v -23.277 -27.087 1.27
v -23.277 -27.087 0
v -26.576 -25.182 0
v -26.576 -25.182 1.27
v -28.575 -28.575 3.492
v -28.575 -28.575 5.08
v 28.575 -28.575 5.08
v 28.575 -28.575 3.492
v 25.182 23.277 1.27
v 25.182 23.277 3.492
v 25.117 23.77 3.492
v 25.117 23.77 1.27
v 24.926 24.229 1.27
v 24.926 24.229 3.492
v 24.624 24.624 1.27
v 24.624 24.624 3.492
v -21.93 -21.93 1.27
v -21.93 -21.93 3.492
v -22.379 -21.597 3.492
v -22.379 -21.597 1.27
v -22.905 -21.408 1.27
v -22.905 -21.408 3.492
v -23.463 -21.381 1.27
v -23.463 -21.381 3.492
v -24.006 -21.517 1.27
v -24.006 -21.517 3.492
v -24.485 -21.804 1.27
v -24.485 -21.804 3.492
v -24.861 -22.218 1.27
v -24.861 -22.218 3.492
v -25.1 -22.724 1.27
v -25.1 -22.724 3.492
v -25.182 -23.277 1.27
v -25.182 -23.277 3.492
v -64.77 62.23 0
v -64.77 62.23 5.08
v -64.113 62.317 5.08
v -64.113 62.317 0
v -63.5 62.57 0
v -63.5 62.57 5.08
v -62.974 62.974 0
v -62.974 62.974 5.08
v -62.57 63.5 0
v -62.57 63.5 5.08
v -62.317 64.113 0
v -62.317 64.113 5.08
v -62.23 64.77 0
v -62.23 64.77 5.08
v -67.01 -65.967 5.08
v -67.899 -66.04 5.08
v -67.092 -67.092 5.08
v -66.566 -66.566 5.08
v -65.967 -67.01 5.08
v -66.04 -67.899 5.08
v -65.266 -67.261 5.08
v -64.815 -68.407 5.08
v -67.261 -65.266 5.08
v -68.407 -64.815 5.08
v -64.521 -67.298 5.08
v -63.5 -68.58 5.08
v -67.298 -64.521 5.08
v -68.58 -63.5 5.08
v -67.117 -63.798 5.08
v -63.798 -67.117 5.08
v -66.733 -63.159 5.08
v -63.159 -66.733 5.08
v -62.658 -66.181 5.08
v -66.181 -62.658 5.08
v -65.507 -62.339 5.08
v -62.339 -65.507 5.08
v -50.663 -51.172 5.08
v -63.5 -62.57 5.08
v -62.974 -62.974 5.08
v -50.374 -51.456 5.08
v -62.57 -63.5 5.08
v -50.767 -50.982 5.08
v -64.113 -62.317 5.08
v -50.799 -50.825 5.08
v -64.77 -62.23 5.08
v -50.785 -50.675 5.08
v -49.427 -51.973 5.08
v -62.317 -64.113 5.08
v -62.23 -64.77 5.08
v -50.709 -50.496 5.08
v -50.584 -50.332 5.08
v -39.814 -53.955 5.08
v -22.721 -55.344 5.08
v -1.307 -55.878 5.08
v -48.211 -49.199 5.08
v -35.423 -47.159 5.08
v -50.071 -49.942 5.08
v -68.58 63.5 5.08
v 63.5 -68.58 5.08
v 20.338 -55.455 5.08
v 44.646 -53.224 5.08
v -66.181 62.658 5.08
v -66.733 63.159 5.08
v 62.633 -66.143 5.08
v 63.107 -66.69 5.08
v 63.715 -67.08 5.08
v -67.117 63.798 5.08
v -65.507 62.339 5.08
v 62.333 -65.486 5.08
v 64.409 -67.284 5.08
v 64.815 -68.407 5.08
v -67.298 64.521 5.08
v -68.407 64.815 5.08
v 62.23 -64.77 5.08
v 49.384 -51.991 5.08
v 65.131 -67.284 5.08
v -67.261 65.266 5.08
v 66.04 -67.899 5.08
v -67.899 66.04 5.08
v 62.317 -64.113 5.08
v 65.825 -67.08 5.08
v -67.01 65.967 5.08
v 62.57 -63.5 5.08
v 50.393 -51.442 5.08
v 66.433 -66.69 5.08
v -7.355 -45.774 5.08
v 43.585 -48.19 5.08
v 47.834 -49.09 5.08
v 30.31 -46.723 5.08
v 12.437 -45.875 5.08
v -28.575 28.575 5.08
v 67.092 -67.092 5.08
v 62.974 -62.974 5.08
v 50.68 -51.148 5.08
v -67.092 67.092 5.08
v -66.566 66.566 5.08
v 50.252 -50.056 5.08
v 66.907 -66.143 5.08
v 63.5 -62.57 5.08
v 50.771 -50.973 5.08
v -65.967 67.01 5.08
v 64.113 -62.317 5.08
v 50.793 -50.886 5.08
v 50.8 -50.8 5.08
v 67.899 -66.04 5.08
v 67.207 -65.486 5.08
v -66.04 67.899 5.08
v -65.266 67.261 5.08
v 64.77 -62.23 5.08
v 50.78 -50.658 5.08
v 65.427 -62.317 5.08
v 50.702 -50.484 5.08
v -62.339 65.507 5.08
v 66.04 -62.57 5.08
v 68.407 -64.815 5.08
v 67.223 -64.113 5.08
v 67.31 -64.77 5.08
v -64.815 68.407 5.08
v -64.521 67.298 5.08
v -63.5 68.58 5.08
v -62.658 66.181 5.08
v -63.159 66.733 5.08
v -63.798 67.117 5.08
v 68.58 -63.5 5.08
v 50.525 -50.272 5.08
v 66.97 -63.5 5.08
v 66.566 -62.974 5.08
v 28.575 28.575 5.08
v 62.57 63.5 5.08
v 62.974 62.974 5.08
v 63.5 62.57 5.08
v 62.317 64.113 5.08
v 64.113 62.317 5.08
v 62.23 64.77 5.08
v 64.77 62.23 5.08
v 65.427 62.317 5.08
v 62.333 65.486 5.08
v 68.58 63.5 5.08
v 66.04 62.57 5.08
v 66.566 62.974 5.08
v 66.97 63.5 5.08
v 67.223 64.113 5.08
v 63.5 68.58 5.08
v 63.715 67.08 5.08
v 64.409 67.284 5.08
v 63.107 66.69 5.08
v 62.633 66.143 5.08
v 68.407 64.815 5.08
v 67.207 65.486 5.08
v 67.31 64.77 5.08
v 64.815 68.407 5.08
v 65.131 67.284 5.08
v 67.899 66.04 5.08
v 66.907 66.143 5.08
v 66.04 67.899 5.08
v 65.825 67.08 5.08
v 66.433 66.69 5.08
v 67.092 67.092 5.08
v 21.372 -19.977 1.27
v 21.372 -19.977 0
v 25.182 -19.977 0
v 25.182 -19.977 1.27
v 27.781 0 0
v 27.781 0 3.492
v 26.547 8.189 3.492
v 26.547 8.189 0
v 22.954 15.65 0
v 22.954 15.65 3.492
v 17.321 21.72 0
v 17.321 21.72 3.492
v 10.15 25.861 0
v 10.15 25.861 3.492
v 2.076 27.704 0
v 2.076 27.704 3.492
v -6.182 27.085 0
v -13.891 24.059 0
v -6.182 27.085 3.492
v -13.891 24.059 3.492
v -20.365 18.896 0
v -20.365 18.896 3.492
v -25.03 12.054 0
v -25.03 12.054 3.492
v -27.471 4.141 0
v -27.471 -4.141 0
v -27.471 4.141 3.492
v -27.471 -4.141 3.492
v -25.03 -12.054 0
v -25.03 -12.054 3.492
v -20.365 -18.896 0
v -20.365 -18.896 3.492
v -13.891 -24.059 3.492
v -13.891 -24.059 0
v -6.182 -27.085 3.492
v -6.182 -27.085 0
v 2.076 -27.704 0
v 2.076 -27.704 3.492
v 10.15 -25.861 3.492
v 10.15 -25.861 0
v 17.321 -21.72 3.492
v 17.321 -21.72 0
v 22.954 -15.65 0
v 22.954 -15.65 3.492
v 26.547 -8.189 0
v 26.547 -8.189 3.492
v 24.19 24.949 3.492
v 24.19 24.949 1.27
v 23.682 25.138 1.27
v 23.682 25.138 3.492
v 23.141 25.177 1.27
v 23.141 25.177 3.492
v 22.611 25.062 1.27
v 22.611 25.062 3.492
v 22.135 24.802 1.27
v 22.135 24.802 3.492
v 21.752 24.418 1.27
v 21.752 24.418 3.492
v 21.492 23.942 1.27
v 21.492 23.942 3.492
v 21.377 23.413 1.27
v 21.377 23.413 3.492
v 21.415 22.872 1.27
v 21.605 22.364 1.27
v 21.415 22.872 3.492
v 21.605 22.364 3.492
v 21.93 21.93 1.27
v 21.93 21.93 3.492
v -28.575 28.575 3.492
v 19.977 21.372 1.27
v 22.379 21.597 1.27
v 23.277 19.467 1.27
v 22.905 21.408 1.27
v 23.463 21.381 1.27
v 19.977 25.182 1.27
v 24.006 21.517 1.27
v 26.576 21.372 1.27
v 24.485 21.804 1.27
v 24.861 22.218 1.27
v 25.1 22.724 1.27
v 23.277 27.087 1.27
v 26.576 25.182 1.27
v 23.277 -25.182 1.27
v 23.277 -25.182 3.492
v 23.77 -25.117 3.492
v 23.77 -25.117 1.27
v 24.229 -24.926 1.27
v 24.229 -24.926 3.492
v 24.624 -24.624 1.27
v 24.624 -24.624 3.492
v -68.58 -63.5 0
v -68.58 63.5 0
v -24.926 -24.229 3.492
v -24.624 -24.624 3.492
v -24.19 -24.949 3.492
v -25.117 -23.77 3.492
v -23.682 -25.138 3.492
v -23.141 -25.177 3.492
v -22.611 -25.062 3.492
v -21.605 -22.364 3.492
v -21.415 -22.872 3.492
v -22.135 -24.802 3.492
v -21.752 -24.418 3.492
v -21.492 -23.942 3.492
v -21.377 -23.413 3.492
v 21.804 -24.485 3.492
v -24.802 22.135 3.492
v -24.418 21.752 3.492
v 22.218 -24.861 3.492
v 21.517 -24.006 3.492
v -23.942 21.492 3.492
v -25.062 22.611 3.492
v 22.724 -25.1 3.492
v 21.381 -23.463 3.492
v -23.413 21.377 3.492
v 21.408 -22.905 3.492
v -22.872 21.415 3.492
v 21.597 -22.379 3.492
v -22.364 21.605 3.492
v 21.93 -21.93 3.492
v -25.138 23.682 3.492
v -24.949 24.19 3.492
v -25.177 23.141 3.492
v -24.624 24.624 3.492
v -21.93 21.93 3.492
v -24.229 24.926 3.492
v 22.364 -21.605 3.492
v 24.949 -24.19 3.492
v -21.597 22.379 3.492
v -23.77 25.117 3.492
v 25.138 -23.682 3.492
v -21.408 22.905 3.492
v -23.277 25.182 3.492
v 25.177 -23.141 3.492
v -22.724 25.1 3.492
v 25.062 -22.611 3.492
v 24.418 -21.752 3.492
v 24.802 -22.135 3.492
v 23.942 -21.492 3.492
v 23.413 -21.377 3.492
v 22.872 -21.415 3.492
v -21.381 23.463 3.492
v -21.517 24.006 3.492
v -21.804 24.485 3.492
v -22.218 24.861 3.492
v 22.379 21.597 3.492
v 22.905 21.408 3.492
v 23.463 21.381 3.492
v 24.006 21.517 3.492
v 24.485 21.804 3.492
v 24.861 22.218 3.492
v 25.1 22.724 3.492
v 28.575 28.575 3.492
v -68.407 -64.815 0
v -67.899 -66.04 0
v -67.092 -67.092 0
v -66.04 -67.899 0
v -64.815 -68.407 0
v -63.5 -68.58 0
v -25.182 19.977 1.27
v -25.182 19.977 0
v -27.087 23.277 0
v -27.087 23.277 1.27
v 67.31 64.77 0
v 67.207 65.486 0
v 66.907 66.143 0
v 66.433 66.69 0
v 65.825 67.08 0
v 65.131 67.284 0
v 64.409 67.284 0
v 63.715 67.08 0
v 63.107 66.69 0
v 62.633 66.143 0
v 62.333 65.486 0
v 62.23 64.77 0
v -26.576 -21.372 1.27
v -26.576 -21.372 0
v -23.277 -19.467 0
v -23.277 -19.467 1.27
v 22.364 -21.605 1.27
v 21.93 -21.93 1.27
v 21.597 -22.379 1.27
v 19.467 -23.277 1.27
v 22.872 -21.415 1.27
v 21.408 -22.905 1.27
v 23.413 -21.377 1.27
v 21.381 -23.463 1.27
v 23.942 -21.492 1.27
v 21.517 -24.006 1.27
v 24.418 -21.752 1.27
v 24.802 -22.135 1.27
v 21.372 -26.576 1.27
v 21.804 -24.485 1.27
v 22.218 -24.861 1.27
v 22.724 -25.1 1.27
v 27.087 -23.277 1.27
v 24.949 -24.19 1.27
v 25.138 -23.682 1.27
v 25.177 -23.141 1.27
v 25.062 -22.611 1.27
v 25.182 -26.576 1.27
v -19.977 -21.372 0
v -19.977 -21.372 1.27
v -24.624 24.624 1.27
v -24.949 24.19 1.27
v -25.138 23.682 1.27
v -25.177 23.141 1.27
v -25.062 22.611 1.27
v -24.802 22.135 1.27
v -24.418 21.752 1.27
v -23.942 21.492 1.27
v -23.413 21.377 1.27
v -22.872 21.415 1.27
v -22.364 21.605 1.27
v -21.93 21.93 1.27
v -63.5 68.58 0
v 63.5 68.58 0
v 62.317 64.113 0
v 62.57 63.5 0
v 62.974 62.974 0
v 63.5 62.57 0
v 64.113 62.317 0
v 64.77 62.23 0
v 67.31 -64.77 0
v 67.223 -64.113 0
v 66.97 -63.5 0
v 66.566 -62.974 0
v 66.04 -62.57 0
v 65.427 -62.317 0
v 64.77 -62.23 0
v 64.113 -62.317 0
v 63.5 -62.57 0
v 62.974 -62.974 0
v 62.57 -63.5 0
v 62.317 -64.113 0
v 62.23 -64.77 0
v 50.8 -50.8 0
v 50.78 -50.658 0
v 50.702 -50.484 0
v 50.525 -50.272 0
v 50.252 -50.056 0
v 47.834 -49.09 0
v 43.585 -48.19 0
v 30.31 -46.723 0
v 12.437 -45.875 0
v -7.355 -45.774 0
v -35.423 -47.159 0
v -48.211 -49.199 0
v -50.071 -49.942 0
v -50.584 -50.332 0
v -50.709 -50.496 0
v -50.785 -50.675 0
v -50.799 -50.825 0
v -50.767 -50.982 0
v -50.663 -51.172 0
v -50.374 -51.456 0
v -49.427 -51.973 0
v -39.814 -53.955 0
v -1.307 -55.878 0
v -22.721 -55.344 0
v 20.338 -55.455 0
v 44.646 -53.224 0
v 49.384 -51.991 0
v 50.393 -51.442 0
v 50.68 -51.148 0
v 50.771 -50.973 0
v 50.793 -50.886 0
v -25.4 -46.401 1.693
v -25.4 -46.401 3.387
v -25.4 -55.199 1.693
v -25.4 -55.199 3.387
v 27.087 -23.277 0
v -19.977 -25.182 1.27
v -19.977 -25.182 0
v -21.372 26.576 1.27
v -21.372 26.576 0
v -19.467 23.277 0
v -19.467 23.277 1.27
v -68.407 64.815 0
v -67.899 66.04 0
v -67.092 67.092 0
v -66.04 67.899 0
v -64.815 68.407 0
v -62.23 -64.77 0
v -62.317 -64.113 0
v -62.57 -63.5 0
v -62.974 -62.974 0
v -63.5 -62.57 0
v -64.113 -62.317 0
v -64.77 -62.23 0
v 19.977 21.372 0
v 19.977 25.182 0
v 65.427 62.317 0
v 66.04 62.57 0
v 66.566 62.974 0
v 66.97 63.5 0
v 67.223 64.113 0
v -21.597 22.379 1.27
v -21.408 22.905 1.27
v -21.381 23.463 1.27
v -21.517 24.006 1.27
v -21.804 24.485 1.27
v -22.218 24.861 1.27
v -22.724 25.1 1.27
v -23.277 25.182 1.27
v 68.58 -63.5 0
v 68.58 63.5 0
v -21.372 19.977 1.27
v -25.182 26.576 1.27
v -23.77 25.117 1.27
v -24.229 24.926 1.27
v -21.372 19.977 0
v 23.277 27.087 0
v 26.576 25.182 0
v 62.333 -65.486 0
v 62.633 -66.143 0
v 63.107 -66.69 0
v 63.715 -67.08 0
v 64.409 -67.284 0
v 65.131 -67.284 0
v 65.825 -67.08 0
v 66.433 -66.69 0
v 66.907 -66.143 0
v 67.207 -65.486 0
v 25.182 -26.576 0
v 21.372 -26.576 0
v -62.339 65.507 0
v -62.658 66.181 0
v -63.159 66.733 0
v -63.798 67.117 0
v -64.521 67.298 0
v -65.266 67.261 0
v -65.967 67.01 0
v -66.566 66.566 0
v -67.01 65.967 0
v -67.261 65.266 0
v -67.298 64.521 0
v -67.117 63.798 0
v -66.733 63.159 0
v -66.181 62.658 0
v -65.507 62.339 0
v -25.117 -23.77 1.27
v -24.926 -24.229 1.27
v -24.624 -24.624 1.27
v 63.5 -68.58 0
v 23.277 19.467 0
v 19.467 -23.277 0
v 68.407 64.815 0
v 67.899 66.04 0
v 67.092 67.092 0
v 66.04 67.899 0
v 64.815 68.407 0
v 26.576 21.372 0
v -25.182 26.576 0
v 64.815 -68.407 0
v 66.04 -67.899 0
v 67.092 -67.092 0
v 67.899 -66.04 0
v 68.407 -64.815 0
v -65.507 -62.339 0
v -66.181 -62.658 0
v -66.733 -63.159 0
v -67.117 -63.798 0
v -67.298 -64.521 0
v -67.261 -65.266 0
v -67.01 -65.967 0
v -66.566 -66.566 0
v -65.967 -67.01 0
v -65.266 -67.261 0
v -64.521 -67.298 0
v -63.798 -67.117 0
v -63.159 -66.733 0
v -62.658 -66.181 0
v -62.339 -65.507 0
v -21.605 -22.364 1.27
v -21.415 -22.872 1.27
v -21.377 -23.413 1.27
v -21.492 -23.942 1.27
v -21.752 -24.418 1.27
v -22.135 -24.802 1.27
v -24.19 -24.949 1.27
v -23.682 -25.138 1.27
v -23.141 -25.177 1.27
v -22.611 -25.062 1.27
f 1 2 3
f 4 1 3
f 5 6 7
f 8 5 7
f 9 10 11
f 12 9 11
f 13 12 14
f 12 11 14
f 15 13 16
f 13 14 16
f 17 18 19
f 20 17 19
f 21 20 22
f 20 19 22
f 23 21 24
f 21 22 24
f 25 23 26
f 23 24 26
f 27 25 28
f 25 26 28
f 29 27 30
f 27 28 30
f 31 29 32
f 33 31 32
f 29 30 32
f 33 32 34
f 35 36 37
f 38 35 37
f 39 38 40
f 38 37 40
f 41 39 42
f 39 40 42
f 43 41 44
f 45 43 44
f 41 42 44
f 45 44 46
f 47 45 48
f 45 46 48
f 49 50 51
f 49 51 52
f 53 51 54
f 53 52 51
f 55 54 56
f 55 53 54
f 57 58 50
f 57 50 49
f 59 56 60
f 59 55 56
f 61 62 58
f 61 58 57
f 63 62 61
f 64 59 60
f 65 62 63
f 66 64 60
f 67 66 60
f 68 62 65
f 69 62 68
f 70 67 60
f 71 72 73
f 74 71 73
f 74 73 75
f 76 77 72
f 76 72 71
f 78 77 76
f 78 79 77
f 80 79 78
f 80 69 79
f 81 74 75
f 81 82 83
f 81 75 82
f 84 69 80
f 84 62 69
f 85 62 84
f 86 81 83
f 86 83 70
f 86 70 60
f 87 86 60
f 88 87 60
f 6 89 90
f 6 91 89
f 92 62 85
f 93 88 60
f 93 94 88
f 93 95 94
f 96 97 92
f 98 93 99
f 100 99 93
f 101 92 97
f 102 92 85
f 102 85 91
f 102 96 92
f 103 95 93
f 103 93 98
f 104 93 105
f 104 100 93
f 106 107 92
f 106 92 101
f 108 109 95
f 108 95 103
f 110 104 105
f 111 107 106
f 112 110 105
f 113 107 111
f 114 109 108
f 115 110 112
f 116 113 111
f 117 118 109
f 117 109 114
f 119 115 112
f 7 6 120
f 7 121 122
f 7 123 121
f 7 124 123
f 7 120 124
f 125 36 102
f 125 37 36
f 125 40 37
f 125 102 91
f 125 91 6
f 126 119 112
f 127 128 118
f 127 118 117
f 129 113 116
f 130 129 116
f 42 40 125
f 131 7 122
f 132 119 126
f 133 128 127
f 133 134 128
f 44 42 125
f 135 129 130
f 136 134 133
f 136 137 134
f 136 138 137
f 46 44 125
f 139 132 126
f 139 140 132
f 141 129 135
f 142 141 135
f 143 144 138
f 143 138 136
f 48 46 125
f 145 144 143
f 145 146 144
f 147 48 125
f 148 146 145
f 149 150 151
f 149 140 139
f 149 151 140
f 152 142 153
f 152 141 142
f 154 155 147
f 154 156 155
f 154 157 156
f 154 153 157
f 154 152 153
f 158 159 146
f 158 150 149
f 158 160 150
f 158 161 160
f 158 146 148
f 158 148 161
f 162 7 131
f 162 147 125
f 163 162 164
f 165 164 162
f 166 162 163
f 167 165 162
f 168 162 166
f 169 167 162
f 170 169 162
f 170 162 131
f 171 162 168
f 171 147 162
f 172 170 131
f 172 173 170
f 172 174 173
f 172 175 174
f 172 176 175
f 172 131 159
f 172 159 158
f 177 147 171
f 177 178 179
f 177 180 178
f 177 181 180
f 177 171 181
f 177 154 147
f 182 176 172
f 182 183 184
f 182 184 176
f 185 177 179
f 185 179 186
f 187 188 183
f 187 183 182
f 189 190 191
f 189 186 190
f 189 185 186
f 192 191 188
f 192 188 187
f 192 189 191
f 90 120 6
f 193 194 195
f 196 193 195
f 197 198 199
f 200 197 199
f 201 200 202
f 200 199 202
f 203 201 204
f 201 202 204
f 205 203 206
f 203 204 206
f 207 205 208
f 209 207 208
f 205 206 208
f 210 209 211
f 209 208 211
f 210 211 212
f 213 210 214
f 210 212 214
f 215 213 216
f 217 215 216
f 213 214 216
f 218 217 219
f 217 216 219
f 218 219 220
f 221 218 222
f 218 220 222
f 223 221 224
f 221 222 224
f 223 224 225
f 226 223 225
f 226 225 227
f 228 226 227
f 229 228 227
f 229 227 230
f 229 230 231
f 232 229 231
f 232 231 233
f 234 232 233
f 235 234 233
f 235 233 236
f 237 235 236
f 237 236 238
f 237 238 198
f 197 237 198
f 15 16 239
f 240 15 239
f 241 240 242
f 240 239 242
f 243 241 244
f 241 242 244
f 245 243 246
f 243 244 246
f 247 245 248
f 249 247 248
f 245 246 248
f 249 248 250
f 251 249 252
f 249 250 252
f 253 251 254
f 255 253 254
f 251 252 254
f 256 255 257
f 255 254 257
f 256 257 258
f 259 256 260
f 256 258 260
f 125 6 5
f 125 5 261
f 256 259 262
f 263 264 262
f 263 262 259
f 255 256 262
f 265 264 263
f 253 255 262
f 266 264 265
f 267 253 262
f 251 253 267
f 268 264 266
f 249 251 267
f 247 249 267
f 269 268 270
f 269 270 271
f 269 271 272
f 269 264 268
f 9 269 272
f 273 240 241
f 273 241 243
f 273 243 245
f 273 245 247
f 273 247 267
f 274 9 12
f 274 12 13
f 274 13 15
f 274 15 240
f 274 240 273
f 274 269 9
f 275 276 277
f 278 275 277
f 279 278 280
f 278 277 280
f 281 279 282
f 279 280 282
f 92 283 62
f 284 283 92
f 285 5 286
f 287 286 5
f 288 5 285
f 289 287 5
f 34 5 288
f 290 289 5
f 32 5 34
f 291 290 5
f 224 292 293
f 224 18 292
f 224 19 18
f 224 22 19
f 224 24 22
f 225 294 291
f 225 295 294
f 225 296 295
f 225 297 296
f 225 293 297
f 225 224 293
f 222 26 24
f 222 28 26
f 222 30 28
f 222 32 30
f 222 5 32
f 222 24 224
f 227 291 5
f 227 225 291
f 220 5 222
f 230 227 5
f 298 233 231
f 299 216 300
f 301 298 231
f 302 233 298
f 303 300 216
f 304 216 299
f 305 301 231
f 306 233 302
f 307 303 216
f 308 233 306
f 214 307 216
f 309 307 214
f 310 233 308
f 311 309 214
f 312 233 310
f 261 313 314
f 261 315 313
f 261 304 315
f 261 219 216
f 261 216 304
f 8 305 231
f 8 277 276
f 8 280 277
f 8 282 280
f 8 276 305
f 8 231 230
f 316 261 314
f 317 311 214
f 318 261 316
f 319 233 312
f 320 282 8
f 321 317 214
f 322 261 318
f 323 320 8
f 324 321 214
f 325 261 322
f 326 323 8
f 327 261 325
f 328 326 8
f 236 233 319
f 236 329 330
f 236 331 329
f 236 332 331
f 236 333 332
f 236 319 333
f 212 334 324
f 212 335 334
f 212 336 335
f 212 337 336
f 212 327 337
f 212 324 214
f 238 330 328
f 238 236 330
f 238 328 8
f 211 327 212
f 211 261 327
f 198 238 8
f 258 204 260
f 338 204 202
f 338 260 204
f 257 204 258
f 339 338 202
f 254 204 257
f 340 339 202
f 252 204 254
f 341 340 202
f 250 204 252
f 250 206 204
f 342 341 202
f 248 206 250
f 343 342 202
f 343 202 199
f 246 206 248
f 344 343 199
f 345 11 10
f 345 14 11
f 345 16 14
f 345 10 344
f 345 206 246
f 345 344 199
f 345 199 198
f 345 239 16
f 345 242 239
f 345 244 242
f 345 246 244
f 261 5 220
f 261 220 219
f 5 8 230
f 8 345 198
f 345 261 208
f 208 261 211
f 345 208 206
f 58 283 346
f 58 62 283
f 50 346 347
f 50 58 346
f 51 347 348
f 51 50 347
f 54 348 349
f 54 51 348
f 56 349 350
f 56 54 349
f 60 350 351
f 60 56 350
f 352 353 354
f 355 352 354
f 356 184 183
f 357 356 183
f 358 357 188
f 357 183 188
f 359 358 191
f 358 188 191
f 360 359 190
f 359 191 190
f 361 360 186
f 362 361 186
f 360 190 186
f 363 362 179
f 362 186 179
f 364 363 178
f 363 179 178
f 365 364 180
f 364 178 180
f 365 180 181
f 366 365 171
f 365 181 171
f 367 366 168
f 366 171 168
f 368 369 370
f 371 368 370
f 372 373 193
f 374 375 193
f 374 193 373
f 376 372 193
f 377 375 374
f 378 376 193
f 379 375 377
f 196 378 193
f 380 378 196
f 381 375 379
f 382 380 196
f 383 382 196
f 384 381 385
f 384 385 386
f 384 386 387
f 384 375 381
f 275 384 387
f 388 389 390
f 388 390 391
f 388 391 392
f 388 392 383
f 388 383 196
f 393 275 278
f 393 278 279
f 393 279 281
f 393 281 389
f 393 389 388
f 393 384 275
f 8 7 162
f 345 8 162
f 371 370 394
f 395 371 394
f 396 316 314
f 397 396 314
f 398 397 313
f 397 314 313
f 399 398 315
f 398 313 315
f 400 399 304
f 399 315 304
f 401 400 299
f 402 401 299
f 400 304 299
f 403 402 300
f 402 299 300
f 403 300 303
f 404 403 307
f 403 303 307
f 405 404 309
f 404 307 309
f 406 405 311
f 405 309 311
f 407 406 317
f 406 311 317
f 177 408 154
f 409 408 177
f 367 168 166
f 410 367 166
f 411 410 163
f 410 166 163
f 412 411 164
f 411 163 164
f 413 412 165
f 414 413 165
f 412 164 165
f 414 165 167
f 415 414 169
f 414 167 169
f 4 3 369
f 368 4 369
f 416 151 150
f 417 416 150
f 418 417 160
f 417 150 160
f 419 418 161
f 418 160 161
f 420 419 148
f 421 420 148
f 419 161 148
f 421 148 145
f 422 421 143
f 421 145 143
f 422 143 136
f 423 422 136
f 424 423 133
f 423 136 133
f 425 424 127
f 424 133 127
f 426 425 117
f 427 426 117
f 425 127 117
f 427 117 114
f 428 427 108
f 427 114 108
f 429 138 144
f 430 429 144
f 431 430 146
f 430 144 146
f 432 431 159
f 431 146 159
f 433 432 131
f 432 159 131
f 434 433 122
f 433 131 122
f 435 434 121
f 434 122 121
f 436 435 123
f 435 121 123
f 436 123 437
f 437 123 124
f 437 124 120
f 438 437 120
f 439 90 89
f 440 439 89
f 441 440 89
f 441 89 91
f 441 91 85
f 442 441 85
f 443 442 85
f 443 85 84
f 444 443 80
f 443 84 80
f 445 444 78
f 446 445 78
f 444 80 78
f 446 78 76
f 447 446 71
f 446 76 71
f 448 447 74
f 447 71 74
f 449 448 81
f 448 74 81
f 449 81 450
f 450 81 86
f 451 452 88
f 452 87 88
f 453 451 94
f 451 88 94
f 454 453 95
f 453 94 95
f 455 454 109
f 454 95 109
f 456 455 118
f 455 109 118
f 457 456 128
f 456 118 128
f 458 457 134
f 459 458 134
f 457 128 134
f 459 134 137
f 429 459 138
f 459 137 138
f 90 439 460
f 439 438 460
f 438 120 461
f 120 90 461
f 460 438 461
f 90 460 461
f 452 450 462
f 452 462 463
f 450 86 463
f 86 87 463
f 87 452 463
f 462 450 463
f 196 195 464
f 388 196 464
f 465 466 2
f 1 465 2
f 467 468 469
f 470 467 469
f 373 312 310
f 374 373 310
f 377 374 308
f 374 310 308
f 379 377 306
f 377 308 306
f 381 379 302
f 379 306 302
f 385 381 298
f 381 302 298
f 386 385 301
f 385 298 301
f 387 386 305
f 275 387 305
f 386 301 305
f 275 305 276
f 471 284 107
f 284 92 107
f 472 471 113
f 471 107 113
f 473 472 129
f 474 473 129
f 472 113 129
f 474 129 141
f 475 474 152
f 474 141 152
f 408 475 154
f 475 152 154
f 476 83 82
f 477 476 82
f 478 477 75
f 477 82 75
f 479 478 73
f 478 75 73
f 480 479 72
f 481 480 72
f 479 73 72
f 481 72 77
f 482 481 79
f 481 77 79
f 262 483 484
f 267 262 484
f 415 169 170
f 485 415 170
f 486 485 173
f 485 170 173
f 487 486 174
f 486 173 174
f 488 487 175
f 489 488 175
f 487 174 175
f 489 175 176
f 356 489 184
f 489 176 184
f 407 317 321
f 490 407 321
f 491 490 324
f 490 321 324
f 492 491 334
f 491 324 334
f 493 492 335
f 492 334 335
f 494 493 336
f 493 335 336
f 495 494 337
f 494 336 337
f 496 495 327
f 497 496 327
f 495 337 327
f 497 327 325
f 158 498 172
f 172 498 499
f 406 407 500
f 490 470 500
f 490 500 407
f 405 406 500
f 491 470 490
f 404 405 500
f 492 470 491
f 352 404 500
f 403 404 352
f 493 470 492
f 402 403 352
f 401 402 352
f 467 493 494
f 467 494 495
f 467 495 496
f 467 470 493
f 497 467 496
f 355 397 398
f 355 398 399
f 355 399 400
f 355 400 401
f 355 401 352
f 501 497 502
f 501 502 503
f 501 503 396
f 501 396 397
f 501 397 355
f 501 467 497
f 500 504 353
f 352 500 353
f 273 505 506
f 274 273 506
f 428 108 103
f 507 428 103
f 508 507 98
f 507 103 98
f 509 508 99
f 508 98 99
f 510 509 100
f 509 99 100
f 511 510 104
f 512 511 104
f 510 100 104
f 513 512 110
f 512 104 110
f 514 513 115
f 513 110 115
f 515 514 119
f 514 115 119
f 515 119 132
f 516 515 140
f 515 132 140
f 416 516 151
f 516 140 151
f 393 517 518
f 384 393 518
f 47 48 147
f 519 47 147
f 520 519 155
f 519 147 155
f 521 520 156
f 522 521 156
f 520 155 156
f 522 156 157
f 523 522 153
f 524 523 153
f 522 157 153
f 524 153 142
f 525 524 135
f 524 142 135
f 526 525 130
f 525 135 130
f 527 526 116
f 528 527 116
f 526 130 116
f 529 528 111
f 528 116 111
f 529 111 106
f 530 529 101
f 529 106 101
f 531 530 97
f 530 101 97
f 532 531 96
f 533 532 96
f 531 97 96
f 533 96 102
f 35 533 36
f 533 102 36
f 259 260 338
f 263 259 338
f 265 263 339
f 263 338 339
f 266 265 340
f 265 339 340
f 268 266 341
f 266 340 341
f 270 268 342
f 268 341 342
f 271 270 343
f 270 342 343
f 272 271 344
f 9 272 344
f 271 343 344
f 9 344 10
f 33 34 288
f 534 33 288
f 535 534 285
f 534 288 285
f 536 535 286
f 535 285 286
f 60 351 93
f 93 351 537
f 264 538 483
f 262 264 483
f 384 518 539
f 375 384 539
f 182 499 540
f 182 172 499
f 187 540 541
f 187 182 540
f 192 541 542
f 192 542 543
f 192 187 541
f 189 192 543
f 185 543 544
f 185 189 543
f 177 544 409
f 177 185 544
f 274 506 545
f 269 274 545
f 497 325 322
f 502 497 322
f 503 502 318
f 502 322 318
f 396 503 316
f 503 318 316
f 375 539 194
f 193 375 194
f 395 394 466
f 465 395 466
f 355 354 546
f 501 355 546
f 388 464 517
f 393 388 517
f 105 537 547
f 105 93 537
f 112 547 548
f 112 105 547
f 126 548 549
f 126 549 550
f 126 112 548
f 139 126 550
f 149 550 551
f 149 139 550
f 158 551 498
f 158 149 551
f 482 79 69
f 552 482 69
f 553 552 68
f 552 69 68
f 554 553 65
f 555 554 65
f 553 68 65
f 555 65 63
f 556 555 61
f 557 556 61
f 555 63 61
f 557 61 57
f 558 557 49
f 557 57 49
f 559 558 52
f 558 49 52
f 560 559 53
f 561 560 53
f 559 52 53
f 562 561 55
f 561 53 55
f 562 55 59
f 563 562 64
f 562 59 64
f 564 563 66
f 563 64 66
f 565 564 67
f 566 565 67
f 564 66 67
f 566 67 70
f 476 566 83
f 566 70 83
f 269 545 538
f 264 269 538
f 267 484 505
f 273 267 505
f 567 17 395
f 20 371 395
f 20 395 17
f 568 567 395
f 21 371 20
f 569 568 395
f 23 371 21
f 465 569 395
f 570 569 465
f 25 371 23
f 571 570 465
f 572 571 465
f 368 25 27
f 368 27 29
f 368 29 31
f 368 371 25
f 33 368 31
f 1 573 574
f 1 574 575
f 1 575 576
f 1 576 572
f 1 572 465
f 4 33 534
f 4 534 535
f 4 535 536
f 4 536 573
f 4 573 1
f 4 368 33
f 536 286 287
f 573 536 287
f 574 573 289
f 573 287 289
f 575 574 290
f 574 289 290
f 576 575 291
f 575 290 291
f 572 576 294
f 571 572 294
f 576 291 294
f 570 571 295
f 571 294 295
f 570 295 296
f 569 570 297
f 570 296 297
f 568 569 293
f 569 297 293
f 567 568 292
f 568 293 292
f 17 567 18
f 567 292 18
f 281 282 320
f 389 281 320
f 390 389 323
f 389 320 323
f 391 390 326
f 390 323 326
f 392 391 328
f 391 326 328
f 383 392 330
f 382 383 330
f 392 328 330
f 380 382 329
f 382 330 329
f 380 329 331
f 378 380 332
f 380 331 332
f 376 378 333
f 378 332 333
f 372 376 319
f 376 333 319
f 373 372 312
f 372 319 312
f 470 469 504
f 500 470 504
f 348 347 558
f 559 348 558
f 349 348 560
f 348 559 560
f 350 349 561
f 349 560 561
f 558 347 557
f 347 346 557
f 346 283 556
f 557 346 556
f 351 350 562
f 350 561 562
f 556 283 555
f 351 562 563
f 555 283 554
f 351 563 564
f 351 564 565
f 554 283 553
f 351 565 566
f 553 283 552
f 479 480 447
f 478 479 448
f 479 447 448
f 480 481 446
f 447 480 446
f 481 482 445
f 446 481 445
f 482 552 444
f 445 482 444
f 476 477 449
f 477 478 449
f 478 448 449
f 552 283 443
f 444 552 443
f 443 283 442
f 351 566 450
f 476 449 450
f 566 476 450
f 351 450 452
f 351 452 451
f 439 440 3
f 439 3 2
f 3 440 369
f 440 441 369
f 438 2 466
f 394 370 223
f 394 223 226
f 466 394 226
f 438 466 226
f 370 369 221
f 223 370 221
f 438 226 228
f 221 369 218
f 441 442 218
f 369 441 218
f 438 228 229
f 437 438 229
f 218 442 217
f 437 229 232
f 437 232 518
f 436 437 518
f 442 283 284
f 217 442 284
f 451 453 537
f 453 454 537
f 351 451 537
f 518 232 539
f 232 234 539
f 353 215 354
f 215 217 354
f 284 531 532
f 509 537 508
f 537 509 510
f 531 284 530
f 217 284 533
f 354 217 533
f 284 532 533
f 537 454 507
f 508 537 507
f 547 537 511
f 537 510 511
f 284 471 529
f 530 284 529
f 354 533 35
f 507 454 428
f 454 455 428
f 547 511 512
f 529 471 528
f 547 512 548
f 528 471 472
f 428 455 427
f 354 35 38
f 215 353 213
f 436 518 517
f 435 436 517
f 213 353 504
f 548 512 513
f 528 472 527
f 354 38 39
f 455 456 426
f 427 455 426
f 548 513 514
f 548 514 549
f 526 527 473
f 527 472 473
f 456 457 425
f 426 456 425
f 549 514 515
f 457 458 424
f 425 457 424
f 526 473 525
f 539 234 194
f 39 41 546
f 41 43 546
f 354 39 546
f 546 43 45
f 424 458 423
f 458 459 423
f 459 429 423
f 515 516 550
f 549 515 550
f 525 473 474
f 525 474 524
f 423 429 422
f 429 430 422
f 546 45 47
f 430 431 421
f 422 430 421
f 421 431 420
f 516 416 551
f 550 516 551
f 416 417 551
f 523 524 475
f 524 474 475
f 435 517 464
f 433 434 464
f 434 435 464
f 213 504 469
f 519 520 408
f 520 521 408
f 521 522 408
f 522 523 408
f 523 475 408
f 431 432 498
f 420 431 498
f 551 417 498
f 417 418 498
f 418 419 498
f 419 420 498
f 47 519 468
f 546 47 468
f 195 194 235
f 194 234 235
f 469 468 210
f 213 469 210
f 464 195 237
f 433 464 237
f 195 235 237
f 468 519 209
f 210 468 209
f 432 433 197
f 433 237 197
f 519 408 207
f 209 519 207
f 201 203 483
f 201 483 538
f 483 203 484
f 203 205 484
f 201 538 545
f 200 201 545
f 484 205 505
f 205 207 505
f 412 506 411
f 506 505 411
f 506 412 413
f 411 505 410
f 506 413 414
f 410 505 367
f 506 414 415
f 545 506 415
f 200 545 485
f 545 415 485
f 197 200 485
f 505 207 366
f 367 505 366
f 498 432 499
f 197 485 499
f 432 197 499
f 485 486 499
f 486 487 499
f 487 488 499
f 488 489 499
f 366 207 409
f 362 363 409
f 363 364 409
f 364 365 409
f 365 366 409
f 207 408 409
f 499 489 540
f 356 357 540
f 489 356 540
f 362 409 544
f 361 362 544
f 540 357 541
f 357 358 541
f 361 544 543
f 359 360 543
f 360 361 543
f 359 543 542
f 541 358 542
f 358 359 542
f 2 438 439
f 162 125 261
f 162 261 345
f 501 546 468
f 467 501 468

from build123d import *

# Parameters (mm, degrees)
F0_W             = 137.16
F0_H             = 137.16
F1_DEPTH         = 5.08
F2_R             = 5.08
F3_R             = 27.78125
F4_DEPTH         = 5.08
F5_W             = 57.15
F5_H             = 57.15
F6_DEPTH         = 1.5875
F8_DEPTH         = 3.4925
F8_COPIES_COUNT  = 4
F11_DEPTH        = 1.27
F11_COPIES_COUNT = 4
F13_DEPTH        = 5.08
F15_DEPTH        = 5.08


# Not quite as in the source:
# - a pattern or mirror of a feature is missing from the dataset's text; its kind, count and spacing are read off the source's solid


with BuildPart() as f1:
    # F0 (on Top) → F1 (new body)
    with BuildSketch(Plane.XY):
        Rectangle(F0_W, F0_H)
    extrude(amount=F1_DEPTH)

    # F2
    f2_edges = [f1.edges().sort_by_distance(p)[0] for p in [
        (-68.58, -68.58, 2.54),
        (68.58, -68.58, 2.54),
        (68.58, 68.58, 2.54),
        (-68.58, 68.58, 2.54),
    ]]
    fillet(f2_edges, radius=F2_R)

    # F3 (on face) → F4 (cut, through all)
    with BuildSketch(Plane.XY.offset(5.08)):
        Circle(F3_R)
    extrude(amount=-F4_DEPTH, mode=Mode.SUBTRACT)

    # F5 (on face) → F6 (cut)
    with BuildSketch(Plane.XY.offset(5.08)):
        Rectangle(F5_W, F5_H)
    extrude(amount=-F6_DEPTH, mode=Mode.SUBTRACT)

    # F7 (on face) → F8 (cut, through all)
    with BuildSketch(Plane.XY.offset(3.4925)):
        with BuildLine():
            Line((21.9296104704, 21.9296104704), (24.6236873067, 24.6236873067))
            ThreePointArc((24.6236873067, 24.6236873067), (21.9296104704, 24.6236873067), (21.9296104704, 21.9296104704))
        make_face()
        with BuildLine():
            ThreePointArc((25.1816488886, 23.2766488886), (25.036639398, 24.0056608272), (24.6236873067, 24.6236873067))
            Line((24.6236873067, 24.6236873067), (21.9296104704, 21.9296104704))
            ThreePointArc((21.9296104704, 21.9296104704), (24.0056608272, 21.5166583791), (25.1816488886, 23.2766488886))
        make_face()
    f8 = extrude(amount=-F8_DEPTH, mode=Mode.SUBTRACT)

    # F8_copies: F8 ×4 about axis
    f8_copies_axis = Axis((0, 0, 0), (0, 0, 1))
    for i in range(1, F8_COPIES_COUNT):
        add(f8.rotate(f8_copies_axis, i * 360 / F8_COPIES_COUNT), mode=Mode.SUBTRACT)

    # F10 (on face) → F11 (cut)
    with BuildSketch(Plane(origin=(0, 0, 0), x_dir=(1, 0, 0), z_dir=(0, 0, -1))):
        Polygon((27.0866488886, 23.2766488886), (25.1816488886, 26.576205677), (21.3716488886, 26.576205677), (19.4666488886, 23.2766488886), (21.3716488886, 19.9770921002), (25.1816488886, 19.9770921002), align=None)
    f11 = extrude(amount=-F11_DEPTH, mode=Mode.SUBTRACT)

    # F11_copies: F11 ×4 about axis
    f11_copies_axis = Axis((0, 0, 0), (0, 0, 1))
    for i in range(1, F11_COPIES_COUNT):
        add(f11.rotate(f11_copies_axis, i * 360 / F11_COPIES_COUNT), mode=Mode.SUBTRACT)

    # F12 (on face) → F13 (cut, through all)
    with BuildSketch(Plane.XY.offset(5.08)):
        with BuildLine():
            Line((-64.77, 64.77), (-62.23, 64.77))
            ThreePointArc((-62.23, 64.77), (-66.5660512242, 66.5660512242), (-64.77, 62.23))
            Line((-64.77, 62.23), (-64.77, 64.77))
        make_face()
        with BuildLine():
            ThreePointArc((-64.77, 62.23), (-62.9739487758, 62.9739487758), (-62.23, 64.77))
            Line((-62.23, 64.77), (-64.77, 64.77))
            Line((-64.77, 64.77), (-64.77, 62.23))
        make_face()
        with BuildLine():
            Line((-64.77, -64.77), (-64.77, -62.23))
            ThreePointArc((-64.77, -62.23), (-66.5660512242, -66.5660512242), (-62.23, -64.77))
            Line((-62.23, -64.77), (-64.77, -64.77))
        make_face()
        with BuildLine():
            ThreePointArc((-62.23, -64.77), (-62.9739487758, -62.9739487758), (-64.77, -62.23))
            Line((-64.77, -62.23), (-64.77, -64.77))
            Line((-64.77, -64.77), (-62.23, -64.77))
        make_face()
        with BuildLine():
            ThreePointArc((67.31, -64.77), (66.5660512242, -62.9739487758), (64.77, -62.23))
            Line((64.77, -62.23), (64.77, -64.77))
            Line((64.77, -64.77), (62.23, -64.77))
            ThreePointArc((62.23, -64.77), (64.77, -67.31), (67.31, -64.77))
        make_face()
        with BuildLine():
            Line((64.77, -64.77), (64.77, -62.23))
            ThreePointArc((64.77, -62.23), (62.9739487758, -62.9739487758), (62.23, -64.77))
            Line((62.23, -64.77), (64.77, -64.77))
        make_face()
        with BuildLine():
            Line((64.77, 64.77), (62.23, 64.77))
            ThreePointArc((62.23, 64.77), (62.9739487758, 62.9739487758), (64.77, 62.23))
            Line((64.77, 62.23), (64.77, 64.77))
        make_face()
        with BuildLine():
            ThreePointArc((67.31, 64.77), (64.77, 67.31), (62.23, 64.77))
            Line((62.23, 64.77), (64.77, 64.77))
            Line((64.77, 64.77), (64.77, 62.23))
            ThreePointArc((64.77, 62.23), (66.5660512242, 62.9739487758), (67.31, 64.77))
        make_face()
    extrude(amount=-F13_DEPTH, mode=Mode.SUBTRACT)

    # F14 (on face) → F15 (cut, through all)
    with BuildSketch(Plane.XY.offset(5.08)):
        with BuildLine():
            add(Edge.make_bspline(
                [(50.8, -50.8), (50.8, -42.0011818976), (-25.4, -46.4005909488), (-101.6, -50.8), (-25.4, -55.1994090512), (50.8, -59.5988181024), (50.8, -50.8)],
                knots=[0, 0, 0, 2.0943951024, 2.0943951024, 4.1887902048, 4.1887902048, 6.2831853072, 6.2831853072, 6.2831853072], degree=2, weights=[1, 0.5, 1, 0.5, 1, 0.5, 1]))
        make_face()
    extrude(amount=-F15_DEPTH, mode=Mode.SUBTRACT)


solid = f1.part
